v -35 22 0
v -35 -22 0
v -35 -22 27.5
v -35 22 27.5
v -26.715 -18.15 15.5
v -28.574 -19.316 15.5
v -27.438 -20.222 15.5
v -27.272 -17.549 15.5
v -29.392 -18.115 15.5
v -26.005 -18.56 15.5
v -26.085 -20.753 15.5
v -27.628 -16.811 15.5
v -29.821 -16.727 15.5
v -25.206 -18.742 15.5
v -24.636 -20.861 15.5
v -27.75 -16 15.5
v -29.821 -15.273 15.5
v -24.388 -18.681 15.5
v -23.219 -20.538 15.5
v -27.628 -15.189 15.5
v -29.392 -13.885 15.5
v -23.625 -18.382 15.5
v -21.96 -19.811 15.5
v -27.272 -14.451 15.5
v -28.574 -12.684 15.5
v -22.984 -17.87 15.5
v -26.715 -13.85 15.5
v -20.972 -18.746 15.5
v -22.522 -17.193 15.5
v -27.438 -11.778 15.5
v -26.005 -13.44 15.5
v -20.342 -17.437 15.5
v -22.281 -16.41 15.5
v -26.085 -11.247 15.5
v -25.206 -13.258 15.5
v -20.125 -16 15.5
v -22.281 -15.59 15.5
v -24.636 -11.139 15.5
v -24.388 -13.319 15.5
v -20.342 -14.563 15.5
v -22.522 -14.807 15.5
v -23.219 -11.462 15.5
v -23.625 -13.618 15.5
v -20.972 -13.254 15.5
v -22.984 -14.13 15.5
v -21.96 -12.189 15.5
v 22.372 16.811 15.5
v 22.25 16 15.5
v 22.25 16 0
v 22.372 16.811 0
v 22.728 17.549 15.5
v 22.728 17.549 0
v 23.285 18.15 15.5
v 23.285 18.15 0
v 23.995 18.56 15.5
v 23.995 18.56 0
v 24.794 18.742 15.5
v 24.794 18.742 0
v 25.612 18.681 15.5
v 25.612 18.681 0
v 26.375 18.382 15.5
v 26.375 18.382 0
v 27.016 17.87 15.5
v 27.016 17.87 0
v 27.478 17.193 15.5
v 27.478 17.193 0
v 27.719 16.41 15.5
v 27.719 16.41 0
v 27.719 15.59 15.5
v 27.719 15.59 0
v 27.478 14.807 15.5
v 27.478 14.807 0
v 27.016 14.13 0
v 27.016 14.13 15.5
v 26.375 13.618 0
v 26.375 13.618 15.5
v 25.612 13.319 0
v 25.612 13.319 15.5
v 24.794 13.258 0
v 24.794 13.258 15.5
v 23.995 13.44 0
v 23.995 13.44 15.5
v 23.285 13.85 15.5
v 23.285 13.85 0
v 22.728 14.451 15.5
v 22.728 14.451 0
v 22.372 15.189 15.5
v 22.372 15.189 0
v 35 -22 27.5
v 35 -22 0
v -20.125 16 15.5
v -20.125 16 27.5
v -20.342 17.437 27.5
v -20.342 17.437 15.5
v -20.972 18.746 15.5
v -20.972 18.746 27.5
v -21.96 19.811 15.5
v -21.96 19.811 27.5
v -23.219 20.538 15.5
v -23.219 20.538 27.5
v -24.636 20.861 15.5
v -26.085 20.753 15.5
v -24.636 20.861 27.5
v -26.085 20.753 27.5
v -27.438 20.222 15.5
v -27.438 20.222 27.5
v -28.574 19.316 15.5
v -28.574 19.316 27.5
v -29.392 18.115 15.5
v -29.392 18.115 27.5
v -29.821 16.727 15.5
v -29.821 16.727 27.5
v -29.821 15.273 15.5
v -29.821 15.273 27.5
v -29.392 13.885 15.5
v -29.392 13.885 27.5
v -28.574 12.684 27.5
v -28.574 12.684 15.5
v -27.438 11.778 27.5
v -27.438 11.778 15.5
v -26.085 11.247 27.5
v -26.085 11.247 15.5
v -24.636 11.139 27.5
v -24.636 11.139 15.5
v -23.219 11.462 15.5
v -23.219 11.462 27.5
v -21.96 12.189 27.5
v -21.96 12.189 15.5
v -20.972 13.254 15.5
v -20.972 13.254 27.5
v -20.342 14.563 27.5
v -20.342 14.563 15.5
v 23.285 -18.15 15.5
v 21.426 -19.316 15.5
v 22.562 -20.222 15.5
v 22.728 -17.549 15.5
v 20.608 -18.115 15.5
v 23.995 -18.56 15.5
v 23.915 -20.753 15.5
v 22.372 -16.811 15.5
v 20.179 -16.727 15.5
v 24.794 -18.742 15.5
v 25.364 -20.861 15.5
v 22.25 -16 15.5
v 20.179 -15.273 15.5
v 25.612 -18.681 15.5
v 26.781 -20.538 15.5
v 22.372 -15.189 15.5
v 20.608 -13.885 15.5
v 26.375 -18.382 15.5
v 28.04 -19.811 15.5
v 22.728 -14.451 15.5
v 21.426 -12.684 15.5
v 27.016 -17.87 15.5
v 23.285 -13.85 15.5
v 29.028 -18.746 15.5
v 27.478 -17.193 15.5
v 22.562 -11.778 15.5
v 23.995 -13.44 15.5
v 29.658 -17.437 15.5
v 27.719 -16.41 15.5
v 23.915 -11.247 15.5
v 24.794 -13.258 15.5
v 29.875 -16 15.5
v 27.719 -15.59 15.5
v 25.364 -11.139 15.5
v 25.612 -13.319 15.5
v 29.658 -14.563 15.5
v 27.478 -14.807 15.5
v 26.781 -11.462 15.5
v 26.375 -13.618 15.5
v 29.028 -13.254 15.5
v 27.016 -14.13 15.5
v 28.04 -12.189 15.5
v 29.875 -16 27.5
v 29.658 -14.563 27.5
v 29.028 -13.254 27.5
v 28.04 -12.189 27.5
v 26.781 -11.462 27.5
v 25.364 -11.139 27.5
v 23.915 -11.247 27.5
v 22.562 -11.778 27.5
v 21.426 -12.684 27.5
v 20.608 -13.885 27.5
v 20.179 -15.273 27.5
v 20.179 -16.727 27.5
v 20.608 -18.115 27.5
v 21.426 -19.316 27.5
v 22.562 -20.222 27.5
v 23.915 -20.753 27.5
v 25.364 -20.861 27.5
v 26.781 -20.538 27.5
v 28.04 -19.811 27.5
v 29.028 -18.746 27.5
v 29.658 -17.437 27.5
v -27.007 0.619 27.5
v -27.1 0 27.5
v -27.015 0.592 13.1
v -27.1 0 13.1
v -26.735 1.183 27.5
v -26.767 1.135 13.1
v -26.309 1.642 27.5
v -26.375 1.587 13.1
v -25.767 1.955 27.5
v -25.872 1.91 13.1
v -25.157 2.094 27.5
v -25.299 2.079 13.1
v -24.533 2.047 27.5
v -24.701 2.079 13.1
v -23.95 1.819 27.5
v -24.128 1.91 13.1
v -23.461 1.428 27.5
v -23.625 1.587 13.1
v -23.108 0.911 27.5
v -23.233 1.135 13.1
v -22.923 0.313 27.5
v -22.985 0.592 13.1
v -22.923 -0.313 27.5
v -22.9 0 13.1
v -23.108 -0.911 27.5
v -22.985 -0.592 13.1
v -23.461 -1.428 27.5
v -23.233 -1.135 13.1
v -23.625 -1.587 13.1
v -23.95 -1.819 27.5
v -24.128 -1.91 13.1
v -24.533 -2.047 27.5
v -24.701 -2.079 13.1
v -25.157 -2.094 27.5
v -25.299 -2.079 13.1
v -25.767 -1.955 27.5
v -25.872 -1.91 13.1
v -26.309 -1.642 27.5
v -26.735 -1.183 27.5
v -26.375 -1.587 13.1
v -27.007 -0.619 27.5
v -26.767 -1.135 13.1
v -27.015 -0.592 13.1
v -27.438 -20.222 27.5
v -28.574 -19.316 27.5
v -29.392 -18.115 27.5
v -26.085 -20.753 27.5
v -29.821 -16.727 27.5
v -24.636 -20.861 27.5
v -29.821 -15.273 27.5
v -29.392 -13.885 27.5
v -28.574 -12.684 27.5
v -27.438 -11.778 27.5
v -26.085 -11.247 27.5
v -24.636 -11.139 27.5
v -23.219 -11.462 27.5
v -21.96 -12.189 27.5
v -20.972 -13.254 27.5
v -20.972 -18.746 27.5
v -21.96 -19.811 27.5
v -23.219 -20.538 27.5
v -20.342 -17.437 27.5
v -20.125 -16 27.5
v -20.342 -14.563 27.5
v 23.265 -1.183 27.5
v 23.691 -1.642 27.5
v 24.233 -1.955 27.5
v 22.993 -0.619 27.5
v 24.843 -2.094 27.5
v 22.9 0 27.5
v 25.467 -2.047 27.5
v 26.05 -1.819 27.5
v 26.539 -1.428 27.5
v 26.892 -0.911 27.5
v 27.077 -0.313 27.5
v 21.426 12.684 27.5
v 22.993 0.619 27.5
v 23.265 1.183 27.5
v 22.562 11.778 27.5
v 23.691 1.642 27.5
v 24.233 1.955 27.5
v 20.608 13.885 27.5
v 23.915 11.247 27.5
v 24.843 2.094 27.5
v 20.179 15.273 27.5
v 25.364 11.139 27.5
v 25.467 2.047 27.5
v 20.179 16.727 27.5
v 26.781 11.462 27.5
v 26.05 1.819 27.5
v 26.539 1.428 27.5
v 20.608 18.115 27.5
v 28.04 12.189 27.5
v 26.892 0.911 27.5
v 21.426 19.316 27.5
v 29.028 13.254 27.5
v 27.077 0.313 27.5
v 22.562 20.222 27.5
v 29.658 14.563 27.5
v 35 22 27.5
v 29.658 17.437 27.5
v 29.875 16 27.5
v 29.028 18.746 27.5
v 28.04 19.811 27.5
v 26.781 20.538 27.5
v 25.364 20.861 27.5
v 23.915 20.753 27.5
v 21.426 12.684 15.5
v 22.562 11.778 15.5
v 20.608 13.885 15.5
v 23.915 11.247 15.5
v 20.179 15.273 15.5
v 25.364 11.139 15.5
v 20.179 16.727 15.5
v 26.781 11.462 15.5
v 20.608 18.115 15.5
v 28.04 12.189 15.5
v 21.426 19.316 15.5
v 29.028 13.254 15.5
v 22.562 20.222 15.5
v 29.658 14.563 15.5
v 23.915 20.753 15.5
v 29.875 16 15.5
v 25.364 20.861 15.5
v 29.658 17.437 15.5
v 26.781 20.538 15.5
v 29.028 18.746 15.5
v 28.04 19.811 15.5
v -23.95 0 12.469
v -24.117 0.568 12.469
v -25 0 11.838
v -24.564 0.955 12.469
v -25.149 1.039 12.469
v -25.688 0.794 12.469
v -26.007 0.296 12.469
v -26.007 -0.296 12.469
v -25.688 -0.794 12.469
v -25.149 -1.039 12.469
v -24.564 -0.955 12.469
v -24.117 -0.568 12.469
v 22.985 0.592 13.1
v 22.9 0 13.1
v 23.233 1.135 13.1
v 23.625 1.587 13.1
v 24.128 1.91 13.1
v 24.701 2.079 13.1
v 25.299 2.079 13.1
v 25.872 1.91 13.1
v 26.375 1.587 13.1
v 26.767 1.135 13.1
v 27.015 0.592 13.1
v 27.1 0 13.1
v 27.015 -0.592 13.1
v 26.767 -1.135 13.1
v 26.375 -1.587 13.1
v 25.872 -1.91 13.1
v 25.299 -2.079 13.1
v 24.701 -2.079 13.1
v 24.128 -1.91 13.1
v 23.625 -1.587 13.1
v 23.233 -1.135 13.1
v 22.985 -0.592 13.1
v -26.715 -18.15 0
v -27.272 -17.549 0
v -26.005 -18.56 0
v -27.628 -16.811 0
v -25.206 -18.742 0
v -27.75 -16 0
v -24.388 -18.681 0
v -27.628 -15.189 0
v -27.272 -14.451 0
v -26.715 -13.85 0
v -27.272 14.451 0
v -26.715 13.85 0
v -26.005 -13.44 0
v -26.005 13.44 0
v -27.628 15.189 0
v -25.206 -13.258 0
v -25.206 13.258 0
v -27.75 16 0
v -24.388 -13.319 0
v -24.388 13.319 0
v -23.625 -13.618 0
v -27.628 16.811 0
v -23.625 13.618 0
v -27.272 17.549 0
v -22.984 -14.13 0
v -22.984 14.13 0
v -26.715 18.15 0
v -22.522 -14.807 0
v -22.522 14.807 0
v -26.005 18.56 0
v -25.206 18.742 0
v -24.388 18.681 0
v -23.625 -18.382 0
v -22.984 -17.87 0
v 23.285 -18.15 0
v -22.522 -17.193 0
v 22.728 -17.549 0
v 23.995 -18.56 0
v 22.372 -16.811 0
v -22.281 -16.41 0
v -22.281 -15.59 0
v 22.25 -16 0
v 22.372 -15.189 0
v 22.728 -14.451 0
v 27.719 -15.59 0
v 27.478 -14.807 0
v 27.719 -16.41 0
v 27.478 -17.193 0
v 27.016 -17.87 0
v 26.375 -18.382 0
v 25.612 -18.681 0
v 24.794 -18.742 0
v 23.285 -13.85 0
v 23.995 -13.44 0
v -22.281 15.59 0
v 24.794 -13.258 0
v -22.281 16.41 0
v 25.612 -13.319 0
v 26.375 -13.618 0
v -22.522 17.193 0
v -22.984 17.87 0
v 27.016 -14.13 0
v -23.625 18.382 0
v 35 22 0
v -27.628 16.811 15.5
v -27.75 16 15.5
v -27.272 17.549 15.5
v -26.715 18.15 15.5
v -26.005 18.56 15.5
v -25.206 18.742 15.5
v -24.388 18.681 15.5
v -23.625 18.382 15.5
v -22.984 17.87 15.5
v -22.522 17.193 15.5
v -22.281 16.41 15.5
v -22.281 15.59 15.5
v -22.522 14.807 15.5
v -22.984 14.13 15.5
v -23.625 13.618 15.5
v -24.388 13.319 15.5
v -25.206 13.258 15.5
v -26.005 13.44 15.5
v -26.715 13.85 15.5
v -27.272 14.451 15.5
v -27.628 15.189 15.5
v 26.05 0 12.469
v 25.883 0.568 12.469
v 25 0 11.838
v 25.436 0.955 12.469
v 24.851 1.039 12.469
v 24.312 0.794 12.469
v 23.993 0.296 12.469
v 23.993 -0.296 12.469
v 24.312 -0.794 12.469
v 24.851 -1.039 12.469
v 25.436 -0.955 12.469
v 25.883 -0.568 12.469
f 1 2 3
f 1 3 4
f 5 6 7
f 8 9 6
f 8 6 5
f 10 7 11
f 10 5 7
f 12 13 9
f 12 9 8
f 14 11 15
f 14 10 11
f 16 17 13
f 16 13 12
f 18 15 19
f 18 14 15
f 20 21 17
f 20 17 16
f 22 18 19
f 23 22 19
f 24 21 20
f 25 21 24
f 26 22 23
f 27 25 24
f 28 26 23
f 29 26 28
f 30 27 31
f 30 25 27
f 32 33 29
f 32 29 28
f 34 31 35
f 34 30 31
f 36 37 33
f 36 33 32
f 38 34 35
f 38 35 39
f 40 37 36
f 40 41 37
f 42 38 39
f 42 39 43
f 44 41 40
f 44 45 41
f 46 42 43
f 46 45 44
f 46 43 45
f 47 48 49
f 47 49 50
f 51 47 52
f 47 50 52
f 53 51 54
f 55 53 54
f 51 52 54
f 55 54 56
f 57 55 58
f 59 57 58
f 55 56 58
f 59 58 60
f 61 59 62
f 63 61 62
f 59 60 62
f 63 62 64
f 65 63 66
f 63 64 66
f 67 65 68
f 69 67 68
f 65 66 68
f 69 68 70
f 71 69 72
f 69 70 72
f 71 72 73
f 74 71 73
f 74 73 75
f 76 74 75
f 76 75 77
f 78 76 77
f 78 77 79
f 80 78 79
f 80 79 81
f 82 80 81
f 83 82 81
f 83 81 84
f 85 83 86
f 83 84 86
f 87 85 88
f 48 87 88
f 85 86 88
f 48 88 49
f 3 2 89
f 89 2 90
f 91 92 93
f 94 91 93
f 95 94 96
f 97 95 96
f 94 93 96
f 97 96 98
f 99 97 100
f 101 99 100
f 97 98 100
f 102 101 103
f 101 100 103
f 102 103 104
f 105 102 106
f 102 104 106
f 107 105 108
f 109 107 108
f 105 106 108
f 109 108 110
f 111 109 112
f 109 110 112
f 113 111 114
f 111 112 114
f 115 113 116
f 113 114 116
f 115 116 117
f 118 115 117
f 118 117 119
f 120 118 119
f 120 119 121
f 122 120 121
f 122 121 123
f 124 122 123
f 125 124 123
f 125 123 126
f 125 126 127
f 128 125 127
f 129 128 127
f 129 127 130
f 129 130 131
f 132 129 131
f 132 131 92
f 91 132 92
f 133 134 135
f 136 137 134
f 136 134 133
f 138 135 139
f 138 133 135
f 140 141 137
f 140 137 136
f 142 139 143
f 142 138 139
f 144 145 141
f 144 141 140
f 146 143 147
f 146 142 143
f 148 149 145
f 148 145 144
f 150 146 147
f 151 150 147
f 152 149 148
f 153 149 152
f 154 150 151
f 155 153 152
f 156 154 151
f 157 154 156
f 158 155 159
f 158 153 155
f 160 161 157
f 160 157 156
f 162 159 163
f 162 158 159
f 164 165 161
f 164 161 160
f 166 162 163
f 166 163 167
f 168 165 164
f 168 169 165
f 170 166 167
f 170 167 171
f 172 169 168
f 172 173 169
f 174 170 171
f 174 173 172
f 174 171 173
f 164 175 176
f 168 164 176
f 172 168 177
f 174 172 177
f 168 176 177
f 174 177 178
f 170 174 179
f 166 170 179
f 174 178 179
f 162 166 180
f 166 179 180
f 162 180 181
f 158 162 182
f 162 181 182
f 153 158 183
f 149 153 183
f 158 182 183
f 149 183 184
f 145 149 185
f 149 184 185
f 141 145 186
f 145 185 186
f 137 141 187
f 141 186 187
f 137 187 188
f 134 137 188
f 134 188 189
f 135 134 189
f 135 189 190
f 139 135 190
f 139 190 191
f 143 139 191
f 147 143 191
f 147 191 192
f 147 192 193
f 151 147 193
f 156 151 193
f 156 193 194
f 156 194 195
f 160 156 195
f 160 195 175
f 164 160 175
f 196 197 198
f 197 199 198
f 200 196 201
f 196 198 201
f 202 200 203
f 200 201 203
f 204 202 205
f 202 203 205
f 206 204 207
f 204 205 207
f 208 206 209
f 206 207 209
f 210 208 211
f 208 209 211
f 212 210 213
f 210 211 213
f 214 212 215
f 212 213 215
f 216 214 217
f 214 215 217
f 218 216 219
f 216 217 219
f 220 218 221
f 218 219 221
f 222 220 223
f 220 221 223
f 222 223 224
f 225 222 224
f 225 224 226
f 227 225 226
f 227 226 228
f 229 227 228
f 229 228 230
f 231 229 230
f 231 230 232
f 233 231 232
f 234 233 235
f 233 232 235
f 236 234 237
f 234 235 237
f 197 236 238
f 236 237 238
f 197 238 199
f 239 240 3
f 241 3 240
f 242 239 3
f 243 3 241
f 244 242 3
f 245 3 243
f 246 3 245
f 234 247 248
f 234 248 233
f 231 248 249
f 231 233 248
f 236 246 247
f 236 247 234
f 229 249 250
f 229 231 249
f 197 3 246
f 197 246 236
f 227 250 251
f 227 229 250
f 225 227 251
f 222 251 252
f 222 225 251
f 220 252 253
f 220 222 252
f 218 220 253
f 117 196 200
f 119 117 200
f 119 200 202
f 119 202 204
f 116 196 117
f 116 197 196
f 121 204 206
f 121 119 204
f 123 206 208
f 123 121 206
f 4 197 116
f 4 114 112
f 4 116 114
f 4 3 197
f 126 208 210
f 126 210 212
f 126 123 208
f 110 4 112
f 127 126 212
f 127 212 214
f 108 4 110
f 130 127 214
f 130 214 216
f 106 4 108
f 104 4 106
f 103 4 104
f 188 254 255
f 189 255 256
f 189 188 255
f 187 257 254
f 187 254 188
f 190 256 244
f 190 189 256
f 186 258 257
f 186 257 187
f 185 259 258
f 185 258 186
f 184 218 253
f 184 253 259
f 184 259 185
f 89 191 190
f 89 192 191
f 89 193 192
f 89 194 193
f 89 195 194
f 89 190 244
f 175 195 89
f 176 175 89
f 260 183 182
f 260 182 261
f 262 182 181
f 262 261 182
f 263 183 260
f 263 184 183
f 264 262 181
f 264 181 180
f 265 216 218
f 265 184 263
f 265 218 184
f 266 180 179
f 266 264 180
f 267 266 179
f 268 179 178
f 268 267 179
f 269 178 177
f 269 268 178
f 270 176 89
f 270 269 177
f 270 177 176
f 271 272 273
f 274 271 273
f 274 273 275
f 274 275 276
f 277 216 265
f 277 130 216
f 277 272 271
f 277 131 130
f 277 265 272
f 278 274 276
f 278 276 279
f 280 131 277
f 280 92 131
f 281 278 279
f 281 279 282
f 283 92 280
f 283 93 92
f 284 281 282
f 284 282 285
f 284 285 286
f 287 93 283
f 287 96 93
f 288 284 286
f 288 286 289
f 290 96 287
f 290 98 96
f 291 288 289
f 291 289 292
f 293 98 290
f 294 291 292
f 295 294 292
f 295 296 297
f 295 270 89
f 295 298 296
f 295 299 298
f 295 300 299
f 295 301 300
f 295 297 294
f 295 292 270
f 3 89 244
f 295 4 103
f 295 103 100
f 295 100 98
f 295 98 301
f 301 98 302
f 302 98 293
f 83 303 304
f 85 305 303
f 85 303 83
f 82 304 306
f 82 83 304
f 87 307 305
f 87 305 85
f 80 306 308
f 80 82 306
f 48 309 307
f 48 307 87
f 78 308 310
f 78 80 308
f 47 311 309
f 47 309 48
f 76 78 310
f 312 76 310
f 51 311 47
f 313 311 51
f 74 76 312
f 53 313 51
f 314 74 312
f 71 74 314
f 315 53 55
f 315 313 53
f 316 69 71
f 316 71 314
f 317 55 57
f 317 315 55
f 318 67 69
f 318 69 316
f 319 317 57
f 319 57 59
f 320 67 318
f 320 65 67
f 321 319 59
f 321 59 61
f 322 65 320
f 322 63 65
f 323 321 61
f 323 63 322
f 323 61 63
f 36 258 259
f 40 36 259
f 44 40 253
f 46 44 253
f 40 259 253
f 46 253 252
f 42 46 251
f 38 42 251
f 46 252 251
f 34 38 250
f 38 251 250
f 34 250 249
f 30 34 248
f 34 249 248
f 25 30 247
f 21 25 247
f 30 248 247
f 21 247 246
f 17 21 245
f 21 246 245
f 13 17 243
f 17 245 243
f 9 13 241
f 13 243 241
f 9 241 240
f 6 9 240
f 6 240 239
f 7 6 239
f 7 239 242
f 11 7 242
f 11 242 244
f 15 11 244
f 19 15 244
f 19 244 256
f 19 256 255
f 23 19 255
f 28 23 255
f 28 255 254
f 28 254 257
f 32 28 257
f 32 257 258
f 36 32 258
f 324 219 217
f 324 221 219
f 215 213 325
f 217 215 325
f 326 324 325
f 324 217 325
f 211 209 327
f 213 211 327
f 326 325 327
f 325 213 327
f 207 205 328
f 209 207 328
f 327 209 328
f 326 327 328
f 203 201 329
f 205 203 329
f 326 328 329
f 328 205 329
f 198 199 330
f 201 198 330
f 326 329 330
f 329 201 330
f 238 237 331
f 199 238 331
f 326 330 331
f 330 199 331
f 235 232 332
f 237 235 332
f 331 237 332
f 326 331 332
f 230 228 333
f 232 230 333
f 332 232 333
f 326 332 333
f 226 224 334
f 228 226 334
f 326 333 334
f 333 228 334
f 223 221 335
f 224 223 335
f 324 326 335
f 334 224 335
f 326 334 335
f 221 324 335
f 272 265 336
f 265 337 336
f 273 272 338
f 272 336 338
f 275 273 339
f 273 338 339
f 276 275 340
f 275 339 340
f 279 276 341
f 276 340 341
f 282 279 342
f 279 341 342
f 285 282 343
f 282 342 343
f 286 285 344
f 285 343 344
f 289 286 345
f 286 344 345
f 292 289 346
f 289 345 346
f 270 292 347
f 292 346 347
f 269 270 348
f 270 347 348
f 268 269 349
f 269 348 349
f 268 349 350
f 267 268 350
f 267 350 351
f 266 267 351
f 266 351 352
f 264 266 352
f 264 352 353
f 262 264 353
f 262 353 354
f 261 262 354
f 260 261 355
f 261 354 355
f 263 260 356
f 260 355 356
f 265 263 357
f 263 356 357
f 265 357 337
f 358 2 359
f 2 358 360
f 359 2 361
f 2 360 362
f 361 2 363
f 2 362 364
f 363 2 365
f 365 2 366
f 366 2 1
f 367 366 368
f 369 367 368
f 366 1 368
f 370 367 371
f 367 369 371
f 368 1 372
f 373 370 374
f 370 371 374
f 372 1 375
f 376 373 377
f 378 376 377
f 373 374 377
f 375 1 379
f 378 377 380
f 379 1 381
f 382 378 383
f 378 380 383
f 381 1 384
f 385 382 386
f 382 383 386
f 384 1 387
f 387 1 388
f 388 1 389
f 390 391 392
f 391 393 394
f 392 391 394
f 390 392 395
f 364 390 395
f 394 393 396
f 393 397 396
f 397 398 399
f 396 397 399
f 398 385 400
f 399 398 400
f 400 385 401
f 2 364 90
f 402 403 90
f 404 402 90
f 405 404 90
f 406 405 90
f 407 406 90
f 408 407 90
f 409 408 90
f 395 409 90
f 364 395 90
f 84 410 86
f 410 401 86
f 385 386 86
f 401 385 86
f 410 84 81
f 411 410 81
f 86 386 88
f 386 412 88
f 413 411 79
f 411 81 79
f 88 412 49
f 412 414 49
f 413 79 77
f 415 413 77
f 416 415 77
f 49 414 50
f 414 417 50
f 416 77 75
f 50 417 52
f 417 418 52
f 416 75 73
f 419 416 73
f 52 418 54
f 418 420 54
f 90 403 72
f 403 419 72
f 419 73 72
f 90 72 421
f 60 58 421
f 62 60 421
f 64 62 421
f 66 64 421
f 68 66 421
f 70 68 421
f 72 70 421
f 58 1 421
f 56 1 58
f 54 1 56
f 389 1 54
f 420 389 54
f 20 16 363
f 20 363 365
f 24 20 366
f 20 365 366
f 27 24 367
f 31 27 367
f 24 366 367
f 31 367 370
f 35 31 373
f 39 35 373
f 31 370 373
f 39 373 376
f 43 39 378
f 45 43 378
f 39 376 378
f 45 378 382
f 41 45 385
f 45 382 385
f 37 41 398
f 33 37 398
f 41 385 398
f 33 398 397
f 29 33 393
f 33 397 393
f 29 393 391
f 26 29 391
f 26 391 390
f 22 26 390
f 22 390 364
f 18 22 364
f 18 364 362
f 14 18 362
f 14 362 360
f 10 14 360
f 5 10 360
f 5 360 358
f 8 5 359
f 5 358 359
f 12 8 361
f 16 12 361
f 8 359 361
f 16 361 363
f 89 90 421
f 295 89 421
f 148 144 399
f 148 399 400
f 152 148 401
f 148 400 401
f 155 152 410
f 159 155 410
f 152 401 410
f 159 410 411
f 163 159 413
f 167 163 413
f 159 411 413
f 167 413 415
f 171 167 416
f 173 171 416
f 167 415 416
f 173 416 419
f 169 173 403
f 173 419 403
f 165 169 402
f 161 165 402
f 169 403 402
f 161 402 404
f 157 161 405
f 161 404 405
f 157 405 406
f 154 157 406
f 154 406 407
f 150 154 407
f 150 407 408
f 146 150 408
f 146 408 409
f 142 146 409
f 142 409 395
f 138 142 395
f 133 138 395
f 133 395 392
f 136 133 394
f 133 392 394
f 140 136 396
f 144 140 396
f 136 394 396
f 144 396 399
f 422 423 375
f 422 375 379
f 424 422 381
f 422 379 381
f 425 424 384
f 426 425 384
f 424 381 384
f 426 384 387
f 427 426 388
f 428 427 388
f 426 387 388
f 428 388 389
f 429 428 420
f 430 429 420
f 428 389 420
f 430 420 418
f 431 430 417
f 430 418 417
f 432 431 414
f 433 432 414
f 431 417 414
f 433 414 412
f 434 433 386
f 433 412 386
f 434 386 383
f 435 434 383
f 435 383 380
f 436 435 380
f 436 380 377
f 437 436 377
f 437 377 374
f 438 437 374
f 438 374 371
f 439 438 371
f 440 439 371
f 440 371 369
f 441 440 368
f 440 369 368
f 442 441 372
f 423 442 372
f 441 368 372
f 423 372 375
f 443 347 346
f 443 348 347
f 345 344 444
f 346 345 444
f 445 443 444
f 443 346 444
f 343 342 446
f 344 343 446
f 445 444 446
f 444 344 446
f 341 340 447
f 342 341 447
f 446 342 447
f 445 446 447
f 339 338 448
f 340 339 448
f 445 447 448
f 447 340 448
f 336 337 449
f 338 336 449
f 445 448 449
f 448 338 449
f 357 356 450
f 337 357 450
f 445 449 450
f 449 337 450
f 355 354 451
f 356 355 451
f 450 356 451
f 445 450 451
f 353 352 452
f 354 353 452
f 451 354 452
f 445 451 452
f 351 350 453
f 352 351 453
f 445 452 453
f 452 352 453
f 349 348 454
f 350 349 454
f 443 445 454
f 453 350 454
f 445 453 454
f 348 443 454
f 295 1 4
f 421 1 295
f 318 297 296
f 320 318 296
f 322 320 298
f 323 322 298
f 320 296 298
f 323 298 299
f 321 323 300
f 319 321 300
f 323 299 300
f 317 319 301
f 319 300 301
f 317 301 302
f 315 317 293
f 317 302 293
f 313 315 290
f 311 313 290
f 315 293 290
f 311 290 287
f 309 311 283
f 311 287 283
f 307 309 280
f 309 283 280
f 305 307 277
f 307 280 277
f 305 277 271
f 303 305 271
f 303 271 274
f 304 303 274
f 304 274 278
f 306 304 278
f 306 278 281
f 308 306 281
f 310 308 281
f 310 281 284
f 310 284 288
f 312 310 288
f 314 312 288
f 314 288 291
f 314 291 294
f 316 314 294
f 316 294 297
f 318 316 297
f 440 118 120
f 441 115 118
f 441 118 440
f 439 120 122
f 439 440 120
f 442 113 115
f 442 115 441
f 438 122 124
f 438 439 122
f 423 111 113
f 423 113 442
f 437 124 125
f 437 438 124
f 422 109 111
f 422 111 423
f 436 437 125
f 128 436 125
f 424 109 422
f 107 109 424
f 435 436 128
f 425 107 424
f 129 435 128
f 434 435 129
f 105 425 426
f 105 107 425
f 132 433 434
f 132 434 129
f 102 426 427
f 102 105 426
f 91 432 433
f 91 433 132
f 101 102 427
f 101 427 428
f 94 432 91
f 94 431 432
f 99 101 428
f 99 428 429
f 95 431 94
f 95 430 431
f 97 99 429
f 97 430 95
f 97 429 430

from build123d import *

# Parameters (mm, degrees)
F0_W           = 70
F0_H           = 44
F1_DEPTH       = 27.5
F4_D           = 4.2
F4_DEPTH       = 14.4
F4_TIP         = 1.2618073
F5_D           = 5.5
F5_CBORE_D     = 9.75
F5_CBORE_DEPTH = 12


with BuildPart() as f1:
    # F0 (on Top) → F1 (new body)
    with BuildSketch(Plane.XY):
        Rectangle(F0_W, F0_H)
    extrude(amount=F1_DEPTH)

    # F4
    with Locations(Plane.XY.offset(27.5)):
        with Locations((25, 0), (-25, 0)):
            Hole(F4_D / 2, depth=F4_DEPTH)
            with Locations((0, 0, -(F4_DEPTH + F4_TIP / 2))):  # 118° drill point
                Cone(0, F4_D / 2, F4_TIP, mode=Mode.SUBTRACT)

    # F5 (through all)
    with Locations(Plane.XY.offset(27.5)):
        with Locations((25, -16), (25, 16), (-25, -16), (-25, 16)):
            CounterBoreHole(F5_D / 2, F5_CBORE_D / 2, F5_CBORE_DEPTH)


solid = f1.part
